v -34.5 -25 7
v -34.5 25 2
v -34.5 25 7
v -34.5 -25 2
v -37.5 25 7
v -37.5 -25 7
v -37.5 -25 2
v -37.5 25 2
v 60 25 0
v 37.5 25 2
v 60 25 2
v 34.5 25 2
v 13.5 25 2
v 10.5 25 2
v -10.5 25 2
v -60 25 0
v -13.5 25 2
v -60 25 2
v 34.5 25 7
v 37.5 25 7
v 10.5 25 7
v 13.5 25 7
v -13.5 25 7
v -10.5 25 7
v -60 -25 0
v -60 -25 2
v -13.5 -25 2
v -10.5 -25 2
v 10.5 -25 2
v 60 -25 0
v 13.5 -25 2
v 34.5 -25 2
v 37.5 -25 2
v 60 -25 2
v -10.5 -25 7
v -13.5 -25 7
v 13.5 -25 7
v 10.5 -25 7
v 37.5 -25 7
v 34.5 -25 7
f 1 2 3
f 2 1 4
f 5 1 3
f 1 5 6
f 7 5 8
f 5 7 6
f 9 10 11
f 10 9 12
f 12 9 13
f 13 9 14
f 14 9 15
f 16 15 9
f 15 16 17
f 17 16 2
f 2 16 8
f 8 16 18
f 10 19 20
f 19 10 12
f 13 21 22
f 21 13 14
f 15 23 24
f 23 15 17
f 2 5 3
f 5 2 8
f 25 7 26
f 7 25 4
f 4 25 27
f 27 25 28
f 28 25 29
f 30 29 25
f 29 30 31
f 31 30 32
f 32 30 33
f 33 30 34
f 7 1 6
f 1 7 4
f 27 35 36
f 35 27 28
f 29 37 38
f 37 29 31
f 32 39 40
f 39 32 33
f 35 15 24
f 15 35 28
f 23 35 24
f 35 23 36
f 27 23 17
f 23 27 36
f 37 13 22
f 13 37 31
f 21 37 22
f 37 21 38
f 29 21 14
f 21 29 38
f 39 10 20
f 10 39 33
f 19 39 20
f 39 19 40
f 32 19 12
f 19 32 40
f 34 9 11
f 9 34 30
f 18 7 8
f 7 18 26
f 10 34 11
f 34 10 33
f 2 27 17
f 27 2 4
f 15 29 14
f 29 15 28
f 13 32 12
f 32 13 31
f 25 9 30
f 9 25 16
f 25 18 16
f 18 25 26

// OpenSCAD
// Stiffened cover panel
// Flat plate with 4 transverse ribs dividing the length into 5 equal bays

// ---- Plate ----
plate_len   = 120;   // plate length along X (mm)
plate_wid   = 50;    // plate width along Y (mm)
plate_t     = 2;     // plate thickness (mm), z = 0 to 2

// ---- Ribs ----
rib_count   = 4;     // number of ribs
rib_t       = 3;     // rib thickness along X (mm)
rib_h       = 5;     // rib height above plate (mm), z = 2 to 7
rib_pitch   = plate_len / (rib_count + 1);  // centre spacing = 24 mm
overlap     = 0.01;  // small overlap into plate so the union fuses cleanly

$fn = 64;

union() {
    // Base plate, centred in X and Y, resting on z = 0
    translate([-plate_len/2, -plate_wid/2, 0])
        cube([plate_len, plate_wid, plate_t]);

    // Ribs: centres at -36, -12, 12, 36 mm (24 mm from each end, 24 mm apart)
    for (i = [1 : rib_count]) {
        x_c = -plate_len/2 + i * rib_pitch;
        translate([x_c - rib_t/2, -plate_wid/2, plate_t - overlap])
            cube([rib_t, plate_wid, rib_h + overlap]);
    }
}
